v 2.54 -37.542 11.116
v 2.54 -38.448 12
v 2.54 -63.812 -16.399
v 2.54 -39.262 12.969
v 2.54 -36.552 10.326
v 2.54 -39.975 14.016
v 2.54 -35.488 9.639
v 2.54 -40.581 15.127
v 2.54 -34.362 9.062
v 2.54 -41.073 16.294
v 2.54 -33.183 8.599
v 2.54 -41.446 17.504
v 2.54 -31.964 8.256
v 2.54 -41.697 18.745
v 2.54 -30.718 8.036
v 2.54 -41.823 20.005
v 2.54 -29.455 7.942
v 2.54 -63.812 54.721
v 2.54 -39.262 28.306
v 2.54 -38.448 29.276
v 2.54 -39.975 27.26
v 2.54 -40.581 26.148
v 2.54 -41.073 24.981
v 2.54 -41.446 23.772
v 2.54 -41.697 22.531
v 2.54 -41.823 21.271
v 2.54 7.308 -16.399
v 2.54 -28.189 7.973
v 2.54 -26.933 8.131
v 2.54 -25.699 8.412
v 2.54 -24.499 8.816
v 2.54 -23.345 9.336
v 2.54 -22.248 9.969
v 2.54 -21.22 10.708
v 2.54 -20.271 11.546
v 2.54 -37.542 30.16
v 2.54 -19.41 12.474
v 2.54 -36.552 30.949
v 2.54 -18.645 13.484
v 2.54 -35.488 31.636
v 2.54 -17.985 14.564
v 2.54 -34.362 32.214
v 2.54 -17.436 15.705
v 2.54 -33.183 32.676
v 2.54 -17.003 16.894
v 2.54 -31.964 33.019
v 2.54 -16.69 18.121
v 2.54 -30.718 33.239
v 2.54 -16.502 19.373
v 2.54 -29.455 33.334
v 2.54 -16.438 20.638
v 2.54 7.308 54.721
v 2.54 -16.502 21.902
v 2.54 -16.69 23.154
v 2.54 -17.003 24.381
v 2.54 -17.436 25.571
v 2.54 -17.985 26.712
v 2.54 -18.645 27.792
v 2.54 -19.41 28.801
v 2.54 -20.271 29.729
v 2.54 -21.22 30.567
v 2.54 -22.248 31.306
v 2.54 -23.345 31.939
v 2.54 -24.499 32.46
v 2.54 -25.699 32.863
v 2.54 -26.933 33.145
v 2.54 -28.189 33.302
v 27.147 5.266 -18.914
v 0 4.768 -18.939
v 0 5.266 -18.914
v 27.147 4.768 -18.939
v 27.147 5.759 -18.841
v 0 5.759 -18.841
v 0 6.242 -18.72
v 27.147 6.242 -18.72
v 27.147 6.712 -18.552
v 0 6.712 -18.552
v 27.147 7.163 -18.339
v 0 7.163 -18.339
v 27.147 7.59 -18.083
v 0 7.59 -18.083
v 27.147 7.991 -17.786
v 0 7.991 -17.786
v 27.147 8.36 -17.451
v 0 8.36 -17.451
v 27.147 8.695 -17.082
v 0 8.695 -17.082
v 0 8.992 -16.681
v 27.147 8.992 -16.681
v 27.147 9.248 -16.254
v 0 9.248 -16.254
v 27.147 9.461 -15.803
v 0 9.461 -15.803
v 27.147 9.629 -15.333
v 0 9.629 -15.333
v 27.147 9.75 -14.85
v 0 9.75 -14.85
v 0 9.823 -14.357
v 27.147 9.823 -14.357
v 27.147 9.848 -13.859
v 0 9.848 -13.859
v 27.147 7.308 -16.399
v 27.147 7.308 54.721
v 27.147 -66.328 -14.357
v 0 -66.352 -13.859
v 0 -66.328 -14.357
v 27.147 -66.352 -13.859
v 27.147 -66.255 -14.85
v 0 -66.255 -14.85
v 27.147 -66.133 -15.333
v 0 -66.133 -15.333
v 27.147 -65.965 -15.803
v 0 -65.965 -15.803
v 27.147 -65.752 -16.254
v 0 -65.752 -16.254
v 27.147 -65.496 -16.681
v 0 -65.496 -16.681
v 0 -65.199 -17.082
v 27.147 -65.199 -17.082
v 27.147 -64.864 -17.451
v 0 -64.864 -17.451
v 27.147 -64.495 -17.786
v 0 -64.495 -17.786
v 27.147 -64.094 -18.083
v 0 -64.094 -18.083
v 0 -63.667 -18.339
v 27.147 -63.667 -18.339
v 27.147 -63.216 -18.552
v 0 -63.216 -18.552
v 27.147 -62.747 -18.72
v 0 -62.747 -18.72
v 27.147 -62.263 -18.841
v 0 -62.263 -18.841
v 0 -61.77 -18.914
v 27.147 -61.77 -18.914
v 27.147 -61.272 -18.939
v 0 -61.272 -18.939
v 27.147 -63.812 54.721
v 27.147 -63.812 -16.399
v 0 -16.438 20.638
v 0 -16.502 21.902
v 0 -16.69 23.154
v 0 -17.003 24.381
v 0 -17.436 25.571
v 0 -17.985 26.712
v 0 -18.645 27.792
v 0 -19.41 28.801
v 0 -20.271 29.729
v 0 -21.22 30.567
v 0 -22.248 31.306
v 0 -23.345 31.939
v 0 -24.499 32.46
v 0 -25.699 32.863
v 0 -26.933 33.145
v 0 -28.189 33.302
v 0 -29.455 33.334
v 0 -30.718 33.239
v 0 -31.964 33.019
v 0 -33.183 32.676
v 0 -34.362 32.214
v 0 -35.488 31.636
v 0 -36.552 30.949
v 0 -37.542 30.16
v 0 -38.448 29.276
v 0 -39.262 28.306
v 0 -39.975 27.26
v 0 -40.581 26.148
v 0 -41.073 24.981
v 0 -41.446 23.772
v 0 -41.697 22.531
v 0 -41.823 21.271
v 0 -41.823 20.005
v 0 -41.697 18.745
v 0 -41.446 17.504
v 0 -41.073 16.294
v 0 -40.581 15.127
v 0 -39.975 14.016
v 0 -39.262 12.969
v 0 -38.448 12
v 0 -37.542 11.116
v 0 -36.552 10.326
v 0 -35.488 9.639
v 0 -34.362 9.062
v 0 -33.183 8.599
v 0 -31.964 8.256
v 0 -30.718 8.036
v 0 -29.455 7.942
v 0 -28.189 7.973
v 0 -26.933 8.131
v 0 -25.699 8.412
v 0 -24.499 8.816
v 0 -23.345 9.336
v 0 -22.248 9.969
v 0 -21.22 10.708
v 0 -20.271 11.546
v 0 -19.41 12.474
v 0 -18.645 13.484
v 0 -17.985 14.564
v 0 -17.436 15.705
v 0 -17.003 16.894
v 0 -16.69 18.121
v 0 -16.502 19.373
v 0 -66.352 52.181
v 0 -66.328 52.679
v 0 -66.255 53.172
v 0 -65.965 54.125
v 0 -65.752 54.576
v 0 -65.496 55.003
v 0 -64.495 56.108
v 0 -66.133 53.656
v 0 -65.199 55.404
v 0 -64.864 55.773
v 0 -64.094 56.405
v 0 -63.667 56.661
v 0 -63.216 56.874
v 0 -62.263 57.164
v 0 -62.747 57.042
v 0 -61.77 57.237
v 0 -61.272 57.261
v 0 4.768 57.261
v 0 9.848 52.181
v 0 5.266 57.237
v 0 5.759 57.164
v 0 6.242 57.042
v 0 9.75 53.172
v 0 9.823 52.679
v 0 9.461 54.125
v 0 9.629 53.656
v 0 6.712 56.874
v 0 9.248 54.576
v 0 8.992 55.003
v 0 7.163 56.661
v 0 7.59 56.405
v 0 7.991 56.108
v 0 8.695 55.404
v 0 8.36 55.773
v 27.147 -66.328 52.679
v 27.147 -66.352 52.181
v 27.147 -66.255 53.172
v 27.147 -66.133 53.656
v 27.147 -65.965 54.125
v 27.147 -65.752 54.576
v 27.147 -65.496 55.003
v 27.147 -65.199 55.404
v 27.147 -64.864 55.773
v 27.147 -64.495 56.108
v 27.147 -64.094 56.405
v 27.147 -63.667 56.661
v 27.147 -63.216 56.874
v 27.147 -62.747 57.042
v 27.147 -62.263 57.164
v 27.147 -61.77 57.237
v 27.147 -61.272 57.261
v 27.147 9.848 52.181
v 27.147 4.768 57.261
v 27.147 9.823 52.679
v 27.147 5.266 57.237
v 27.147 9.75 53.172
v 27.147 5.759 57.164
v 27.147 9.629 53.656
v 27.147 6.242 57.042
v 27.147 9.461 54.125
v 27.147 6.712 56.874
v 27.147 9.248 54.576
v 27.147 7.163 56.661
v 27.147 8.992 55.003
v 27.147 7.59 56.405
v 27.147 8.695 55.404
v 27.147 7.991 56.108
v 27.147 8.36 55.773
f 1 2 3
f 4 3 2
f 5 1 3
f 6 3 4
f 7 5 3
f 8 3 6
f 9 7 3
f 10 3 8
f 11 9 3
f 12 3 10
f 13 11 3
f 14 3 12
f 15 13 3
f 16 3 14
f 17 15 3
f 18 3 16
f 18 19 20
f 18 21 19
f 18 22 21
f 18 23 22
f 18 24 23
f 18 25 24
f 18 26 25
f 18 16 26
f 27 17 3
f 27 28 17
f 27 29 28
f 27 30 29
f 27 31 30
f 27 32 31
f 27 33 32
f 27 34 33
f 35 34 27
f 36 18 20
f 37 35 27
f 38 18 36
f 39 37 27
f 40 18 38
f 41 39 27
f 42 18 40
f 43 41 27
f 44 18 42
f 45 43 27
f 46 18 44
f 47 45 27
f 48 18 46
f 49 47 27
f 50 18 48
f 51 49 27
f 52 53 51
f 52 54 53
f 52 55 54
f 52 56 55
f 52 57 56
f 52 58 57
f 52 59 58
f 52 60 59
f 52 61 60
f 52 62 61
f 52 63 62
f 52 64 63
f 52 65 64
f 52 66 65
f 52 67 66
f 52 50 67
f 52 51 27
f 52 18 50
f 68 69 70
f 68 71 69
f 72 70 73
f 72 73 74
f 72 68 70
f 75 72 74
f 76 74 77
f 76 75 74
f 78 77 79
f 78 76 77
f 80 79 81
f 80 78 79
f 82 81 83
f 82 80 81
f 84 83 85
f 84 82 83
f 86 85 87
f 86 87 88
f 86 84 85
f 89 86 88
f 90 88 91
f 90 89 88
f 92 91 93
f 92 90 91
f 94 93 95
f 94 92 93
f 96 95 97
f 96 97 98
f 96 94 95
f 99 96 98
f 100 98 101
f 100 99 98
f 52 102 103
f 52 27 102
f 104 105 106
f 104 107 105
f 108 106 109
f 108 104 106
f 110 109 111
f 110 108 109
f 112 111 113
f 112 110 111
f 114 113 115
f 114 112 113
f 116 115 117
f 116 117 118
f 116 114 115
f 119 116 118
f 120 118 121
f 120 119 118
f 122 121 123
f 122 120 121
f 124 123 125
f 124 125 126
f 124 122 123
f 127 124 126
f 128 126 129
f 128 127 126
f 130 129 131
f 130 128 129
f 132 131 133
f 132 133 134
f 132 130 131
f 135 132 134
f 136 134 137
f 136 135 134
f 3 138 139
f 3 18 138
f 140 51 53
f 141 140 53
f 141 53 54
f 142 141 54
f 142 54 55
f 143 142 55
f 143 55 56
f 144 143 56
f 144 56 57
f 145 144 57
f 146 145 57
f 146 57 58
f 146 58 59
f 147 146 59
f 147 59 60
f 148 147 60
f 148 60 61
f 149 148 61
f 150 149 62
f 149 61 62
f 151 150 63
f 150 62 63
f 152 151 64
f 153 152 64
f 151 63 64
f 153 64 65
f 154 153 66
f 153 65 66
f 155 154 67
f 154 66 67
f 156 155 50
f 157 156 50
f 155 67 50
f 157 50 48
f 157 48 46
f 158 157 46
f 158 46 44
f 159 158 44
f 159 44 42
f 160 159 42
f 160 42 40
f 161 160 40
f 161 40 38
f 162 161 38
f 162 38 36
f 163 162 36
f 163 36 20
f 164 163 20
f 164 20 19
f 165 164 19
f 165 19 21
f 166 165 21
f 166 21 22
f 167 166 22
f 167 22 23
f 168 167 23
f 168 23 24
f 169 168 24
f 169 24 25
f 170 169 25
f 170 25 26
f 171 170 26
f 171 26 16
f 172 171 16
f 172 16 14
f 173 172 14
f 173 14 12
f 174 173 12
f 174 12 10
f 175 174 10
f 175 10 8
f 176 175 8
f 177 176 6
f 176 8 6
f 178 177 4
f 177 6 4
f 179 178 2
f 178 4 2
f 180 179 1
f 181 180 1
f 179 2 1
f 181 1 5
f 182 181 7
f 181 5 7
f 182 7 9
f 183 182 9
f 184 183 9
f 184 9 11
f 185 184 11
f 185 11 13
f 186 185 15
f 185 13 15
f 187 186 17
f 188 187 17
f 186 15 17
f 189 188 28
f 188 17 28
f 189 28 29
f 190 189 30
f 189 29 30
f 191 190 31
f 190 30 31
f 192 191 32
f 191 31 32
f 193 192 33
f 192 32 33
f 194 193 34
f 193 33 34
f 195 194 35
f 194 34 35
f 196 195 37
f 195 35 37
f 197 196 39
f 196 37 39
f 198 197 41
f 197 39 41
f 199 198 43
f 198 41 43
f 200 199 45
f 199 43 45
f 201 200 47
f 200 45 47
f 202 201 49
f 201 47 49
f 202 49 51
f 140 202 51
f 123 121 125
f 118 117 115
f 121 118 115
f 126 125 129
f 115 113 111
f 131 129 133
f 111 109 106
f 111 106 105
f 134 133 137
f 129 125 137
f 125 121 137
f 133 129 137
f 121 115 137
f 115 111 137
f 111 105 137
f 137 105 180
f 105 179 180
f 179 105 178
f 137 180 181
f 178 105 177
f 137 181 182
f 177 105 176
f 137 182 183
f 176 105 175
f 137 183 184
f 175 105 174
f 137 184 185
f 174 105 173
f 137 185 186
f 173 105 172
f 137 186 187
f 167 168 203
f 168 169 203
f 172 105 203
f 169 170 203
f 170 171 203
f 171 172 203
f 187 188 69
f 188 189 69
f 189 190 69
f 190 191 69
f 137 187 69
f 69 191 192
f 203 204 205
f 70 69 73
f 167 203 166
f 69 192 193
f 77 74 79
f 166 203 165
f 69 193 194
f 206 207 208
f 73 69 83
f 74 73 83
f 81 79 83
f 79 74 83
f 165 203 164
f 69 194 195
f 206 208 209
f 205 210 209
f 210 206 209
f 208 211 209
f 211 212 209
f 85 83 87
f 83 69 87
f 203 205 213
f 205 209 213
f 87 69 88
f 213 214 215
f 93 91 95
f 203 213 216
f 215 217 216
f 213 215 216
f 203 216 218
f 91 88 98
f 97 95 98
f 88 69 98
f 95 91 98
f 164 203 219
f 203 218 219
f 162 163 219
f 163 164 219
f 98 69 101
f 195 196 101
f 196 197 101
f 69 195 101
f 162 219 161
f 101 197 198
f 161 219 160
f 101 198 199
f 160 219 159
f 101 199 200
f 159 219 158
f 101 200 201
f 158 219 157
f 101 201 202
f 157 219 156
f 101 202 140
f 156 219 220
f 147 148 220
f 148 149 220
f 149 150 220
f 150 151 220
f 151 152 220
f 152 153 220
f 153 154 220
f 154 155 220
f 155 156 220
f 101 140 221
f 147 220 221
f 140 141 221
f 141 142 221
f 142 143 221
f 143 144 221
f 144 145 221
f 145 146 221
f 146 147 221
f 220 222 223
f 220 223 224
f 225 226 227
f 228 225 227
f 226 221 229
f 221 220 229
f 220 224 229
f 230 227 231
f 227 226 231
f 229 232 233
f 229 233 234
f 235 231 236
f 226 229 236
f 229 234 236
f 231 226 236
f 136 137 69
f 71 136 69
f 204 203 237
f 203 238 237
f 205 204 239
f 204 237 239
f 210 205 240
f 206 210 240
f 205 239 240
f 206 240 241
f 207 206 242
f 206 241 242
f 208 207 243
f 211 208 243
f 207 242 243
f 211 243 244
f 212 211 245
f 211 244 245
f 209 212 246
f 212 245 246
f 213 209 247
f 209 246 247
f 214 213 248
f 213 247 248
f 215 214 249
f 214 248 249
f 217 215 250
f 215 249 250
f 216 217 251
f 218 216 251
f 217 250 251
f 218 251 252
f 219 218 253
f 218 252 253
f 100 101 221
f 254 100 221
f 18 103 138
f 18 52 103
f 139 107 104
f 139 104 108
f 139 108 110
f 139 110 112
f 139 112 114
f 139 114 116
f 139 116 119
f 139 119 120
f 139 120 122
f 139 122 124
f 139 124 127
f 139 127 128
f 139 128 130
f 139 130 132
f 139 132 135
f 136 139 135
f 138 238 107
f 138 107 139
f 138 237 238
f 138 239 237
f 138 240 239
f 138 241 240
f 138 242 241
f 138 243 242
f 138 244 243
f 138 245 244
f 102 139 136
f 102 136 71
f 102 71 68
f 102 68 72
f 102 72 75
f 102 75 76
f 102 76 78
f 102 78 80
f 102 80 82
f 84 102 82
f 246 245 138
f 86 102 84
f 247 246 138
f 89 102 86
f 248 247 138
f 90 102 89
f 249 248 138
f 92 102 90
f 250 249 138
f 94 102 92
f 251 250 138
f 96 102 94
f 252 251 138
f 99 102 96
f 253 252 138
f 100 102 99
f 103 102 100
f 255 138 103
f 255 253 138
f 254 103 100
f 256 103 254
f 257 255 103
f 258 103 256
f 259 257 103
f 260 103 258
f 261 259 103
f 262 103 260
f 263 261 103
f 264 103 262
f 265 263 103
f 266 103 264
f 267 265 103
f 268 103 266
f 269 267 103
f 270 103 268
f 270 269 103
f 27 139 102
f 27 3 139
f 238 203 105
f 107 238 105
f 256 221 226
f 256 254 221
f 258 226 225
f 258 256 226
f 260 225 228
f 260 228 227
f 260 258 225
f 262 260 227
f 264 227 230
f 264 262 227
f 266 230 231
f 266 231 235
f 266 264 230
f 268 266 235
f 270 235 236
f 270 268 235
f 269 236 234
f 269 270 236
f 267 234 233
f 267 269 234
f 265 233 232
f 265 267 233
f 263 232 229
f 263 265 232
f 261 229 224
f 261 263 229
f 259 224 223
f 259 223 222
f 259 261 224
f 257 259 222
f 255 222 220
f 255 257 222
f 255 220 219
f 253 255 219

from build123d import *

# Parameters (mm, degrees)
F1_DEPTH = 27.14701
F2_T     = -2.54
F3_R     = 5.08
F4_R     = 12.7
F5_DEPTH = 51.567206


with BuildPart() as f1:
    # F0 (on Right) → F1 (new body)
    with BuildSketch(Plane.YZ):
        Polygon((-28.252147, 57.261179), (-66.352147, 57.261179), (-66.352147, -18.938821), (9.847853, -18.938821), (9.847853, 57.261179), align=None)
    extrude(amount=F1_DEPTH)

    # F2
    f2_openings = [f1.faces().sort_by_distance(p)[0] for p in [
        (27.14701, -28.252147, 19.161179),
    ]]
    offset(amount=F2_T, openings=f2_openings)

    # F3
    f3_edges = [f1.edges().sort_by_distance(p)[0] for p in [
        (13.573505, 9.847853, -18.938821),
        (13.573505, 9.847853, 57.261179),
        (13.573505, -66.352147, -18.938821),
        (13.573505, -66.352147, 57.261179),
    ]]
    fillet(f3_edges, radius=F3_R)

    # F4 (on face) → F5 (cut)
    with BuildSketch(Plane.YZ.offset(2.54)):
        with Locations((-29.138448, 20.637747)):
            Circle(F4_R)
    extrude(amount=-F5_DEPTH, mode=Mode.SUBTRACT)


solid = f1.part
